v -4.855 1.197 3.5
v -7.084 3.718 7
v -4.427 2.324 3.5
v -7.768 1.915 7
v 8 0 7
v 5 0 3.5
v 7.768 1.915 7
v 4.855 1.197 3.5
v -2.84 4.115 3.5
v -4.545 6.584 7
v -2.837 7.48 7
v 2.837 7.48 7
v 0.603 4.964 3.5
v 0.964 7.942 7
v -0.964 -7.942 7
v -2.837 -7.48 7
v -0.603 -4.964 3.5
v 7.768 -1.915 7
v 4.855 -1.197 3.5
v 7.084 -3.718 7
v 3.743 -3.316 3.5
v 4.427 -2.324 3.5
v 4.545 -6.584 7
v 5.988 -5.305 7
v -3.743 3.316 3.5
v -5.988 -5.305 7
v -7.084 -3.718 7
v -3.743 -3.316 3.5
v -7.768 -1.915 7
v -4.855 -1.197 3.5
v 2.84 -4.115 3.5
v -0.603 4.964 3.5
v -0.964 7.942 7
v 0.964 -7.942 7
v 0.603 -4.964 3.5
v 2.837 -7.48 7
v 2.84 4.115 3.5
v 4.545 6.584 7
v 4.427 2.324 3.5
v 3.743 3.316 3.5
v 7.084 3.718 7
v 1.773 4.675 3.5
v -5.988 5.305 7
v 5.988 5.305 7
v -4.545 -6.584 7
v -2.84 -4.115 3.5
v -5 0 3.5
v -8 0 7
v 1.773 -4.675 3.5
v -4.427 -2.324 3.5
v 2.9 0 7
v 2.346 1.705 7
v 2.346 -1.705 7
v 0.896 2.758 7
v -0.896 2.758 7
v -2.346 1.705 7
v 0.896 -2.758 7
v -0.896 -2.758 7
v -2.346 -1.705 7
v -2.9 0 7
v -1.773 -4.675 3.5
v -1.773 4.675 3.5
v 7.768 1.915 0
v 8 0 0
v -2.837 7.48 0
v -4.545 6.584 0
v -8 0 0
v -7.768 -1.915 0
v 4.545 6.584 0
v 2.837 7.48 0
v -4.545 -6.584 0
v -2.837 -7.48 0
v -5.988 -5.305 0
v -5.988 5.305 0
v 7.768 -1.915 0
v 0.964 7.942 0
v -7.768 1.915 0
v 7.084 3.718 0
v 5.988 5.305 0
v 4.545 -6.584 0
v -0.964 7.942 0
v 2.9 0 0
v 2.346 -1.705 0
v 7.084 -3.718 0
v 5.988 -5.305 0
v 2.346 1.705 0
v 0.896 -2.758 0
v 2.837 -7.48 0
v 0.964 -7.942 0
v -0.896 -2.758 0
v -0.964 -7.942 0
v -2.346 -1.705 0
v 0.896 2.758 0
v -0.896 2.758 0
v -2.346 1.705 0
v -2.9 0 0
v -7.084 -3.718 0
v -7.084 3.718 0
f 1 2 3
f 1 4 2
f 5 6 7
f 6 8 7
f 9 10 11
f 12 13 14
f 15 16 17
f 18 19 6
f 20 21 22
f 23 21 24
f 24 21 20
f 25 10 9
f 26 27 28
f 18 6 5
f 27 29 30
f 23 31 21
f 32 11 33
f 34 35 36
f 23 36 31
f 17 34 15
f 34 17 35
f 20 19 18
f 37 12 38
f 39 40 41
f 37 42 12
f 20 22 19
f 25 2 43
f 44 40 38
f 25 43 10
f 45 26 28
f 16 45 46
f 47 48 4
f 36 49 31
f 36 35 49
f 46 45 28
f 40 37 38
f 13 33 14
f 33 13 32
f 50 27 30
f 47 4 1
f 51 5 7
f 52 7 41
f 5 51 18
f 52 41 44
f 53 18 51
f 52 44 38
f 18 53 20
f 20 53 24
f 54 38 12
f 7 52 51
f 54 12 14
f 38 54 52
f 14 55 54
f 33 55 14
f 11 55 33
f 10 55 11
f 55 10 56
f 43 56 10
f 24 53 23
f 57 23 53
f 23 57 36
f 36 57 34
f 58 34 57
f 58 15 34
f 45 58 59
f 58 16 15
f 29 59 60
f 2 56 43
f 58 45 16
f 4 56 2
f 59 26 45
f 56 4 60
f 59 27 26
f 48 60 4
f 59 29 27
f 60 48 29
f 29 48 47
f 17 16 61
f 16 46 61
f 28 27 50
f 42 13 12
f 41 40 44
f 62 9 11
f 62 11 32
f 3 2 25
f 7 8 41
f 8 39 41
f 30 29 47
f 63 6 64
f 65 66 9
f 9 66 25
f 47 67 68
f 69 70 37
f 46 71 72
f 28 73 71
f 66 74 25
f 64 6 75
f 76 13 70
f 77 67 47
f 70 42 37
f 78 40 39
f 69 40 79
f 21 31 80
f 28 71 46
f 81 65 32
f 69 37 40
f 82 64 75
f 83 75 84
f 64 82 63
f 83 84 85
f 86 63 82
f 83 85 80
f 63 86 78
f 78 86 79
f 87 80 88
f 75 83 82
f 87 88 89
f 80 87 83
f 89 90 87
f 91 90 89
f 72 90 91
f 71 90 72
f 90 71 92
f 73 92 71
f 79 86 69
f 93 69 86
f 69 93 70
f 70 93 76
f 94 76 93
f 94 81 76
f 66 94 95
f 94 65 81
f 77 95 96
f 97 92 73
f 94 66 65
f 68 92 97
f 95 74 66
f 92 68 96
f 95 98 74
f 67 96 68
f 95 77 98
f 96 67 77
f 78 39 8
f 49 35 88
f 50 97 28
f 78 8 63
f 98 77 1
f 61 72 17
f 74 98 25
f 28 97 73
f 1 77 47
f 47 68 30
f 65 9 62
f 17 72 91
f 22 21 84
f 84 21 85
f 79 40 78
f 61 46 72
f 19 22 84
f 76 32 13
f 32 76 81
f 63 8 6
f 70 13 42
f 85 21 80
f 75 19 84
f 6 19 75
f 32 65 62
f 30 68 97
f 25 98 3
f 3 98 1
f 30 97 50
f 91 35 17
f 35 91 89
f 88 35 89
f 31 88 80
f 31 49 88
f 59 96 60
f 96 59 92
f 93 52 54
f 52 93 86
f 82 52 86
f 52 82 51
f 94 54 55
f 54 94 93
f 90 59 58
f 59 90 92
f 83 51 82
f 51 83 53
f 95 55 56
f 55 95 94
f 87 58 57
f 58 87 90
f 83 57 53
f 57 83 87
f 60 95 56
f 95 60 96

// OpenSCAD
// Mendel ball chain pulley for the Y axis. Designed for 3.2-3.5mm chain. Takes a piece of 3/16" brass tube in the centre as a bushing.
//
//  GPL V3 Licenced, by Vik Olliver 2010-03-16

pulley_min_rad=5;
pulley_max_rad=8;
pulley_height=7;
pulley_bushing_rad=2.9;

translate ([0,0,pulley_height/2]) difference () {
	union () {
		translate ([0,0,pulley_height/4])
			cylinder(pulley_height/2,r1=pulley_min_rad,r2=pulley_max_rad,center=true);
		translate ([0,0,-pulley_height/4])
			cylinder(pulley_height/2,r2=pulley_min_rad,r1=pulley_max_rad,center=true);
	}
	cylinder(h=pulley_height*2,r=pulley_bushing_rad, center=true);
}
